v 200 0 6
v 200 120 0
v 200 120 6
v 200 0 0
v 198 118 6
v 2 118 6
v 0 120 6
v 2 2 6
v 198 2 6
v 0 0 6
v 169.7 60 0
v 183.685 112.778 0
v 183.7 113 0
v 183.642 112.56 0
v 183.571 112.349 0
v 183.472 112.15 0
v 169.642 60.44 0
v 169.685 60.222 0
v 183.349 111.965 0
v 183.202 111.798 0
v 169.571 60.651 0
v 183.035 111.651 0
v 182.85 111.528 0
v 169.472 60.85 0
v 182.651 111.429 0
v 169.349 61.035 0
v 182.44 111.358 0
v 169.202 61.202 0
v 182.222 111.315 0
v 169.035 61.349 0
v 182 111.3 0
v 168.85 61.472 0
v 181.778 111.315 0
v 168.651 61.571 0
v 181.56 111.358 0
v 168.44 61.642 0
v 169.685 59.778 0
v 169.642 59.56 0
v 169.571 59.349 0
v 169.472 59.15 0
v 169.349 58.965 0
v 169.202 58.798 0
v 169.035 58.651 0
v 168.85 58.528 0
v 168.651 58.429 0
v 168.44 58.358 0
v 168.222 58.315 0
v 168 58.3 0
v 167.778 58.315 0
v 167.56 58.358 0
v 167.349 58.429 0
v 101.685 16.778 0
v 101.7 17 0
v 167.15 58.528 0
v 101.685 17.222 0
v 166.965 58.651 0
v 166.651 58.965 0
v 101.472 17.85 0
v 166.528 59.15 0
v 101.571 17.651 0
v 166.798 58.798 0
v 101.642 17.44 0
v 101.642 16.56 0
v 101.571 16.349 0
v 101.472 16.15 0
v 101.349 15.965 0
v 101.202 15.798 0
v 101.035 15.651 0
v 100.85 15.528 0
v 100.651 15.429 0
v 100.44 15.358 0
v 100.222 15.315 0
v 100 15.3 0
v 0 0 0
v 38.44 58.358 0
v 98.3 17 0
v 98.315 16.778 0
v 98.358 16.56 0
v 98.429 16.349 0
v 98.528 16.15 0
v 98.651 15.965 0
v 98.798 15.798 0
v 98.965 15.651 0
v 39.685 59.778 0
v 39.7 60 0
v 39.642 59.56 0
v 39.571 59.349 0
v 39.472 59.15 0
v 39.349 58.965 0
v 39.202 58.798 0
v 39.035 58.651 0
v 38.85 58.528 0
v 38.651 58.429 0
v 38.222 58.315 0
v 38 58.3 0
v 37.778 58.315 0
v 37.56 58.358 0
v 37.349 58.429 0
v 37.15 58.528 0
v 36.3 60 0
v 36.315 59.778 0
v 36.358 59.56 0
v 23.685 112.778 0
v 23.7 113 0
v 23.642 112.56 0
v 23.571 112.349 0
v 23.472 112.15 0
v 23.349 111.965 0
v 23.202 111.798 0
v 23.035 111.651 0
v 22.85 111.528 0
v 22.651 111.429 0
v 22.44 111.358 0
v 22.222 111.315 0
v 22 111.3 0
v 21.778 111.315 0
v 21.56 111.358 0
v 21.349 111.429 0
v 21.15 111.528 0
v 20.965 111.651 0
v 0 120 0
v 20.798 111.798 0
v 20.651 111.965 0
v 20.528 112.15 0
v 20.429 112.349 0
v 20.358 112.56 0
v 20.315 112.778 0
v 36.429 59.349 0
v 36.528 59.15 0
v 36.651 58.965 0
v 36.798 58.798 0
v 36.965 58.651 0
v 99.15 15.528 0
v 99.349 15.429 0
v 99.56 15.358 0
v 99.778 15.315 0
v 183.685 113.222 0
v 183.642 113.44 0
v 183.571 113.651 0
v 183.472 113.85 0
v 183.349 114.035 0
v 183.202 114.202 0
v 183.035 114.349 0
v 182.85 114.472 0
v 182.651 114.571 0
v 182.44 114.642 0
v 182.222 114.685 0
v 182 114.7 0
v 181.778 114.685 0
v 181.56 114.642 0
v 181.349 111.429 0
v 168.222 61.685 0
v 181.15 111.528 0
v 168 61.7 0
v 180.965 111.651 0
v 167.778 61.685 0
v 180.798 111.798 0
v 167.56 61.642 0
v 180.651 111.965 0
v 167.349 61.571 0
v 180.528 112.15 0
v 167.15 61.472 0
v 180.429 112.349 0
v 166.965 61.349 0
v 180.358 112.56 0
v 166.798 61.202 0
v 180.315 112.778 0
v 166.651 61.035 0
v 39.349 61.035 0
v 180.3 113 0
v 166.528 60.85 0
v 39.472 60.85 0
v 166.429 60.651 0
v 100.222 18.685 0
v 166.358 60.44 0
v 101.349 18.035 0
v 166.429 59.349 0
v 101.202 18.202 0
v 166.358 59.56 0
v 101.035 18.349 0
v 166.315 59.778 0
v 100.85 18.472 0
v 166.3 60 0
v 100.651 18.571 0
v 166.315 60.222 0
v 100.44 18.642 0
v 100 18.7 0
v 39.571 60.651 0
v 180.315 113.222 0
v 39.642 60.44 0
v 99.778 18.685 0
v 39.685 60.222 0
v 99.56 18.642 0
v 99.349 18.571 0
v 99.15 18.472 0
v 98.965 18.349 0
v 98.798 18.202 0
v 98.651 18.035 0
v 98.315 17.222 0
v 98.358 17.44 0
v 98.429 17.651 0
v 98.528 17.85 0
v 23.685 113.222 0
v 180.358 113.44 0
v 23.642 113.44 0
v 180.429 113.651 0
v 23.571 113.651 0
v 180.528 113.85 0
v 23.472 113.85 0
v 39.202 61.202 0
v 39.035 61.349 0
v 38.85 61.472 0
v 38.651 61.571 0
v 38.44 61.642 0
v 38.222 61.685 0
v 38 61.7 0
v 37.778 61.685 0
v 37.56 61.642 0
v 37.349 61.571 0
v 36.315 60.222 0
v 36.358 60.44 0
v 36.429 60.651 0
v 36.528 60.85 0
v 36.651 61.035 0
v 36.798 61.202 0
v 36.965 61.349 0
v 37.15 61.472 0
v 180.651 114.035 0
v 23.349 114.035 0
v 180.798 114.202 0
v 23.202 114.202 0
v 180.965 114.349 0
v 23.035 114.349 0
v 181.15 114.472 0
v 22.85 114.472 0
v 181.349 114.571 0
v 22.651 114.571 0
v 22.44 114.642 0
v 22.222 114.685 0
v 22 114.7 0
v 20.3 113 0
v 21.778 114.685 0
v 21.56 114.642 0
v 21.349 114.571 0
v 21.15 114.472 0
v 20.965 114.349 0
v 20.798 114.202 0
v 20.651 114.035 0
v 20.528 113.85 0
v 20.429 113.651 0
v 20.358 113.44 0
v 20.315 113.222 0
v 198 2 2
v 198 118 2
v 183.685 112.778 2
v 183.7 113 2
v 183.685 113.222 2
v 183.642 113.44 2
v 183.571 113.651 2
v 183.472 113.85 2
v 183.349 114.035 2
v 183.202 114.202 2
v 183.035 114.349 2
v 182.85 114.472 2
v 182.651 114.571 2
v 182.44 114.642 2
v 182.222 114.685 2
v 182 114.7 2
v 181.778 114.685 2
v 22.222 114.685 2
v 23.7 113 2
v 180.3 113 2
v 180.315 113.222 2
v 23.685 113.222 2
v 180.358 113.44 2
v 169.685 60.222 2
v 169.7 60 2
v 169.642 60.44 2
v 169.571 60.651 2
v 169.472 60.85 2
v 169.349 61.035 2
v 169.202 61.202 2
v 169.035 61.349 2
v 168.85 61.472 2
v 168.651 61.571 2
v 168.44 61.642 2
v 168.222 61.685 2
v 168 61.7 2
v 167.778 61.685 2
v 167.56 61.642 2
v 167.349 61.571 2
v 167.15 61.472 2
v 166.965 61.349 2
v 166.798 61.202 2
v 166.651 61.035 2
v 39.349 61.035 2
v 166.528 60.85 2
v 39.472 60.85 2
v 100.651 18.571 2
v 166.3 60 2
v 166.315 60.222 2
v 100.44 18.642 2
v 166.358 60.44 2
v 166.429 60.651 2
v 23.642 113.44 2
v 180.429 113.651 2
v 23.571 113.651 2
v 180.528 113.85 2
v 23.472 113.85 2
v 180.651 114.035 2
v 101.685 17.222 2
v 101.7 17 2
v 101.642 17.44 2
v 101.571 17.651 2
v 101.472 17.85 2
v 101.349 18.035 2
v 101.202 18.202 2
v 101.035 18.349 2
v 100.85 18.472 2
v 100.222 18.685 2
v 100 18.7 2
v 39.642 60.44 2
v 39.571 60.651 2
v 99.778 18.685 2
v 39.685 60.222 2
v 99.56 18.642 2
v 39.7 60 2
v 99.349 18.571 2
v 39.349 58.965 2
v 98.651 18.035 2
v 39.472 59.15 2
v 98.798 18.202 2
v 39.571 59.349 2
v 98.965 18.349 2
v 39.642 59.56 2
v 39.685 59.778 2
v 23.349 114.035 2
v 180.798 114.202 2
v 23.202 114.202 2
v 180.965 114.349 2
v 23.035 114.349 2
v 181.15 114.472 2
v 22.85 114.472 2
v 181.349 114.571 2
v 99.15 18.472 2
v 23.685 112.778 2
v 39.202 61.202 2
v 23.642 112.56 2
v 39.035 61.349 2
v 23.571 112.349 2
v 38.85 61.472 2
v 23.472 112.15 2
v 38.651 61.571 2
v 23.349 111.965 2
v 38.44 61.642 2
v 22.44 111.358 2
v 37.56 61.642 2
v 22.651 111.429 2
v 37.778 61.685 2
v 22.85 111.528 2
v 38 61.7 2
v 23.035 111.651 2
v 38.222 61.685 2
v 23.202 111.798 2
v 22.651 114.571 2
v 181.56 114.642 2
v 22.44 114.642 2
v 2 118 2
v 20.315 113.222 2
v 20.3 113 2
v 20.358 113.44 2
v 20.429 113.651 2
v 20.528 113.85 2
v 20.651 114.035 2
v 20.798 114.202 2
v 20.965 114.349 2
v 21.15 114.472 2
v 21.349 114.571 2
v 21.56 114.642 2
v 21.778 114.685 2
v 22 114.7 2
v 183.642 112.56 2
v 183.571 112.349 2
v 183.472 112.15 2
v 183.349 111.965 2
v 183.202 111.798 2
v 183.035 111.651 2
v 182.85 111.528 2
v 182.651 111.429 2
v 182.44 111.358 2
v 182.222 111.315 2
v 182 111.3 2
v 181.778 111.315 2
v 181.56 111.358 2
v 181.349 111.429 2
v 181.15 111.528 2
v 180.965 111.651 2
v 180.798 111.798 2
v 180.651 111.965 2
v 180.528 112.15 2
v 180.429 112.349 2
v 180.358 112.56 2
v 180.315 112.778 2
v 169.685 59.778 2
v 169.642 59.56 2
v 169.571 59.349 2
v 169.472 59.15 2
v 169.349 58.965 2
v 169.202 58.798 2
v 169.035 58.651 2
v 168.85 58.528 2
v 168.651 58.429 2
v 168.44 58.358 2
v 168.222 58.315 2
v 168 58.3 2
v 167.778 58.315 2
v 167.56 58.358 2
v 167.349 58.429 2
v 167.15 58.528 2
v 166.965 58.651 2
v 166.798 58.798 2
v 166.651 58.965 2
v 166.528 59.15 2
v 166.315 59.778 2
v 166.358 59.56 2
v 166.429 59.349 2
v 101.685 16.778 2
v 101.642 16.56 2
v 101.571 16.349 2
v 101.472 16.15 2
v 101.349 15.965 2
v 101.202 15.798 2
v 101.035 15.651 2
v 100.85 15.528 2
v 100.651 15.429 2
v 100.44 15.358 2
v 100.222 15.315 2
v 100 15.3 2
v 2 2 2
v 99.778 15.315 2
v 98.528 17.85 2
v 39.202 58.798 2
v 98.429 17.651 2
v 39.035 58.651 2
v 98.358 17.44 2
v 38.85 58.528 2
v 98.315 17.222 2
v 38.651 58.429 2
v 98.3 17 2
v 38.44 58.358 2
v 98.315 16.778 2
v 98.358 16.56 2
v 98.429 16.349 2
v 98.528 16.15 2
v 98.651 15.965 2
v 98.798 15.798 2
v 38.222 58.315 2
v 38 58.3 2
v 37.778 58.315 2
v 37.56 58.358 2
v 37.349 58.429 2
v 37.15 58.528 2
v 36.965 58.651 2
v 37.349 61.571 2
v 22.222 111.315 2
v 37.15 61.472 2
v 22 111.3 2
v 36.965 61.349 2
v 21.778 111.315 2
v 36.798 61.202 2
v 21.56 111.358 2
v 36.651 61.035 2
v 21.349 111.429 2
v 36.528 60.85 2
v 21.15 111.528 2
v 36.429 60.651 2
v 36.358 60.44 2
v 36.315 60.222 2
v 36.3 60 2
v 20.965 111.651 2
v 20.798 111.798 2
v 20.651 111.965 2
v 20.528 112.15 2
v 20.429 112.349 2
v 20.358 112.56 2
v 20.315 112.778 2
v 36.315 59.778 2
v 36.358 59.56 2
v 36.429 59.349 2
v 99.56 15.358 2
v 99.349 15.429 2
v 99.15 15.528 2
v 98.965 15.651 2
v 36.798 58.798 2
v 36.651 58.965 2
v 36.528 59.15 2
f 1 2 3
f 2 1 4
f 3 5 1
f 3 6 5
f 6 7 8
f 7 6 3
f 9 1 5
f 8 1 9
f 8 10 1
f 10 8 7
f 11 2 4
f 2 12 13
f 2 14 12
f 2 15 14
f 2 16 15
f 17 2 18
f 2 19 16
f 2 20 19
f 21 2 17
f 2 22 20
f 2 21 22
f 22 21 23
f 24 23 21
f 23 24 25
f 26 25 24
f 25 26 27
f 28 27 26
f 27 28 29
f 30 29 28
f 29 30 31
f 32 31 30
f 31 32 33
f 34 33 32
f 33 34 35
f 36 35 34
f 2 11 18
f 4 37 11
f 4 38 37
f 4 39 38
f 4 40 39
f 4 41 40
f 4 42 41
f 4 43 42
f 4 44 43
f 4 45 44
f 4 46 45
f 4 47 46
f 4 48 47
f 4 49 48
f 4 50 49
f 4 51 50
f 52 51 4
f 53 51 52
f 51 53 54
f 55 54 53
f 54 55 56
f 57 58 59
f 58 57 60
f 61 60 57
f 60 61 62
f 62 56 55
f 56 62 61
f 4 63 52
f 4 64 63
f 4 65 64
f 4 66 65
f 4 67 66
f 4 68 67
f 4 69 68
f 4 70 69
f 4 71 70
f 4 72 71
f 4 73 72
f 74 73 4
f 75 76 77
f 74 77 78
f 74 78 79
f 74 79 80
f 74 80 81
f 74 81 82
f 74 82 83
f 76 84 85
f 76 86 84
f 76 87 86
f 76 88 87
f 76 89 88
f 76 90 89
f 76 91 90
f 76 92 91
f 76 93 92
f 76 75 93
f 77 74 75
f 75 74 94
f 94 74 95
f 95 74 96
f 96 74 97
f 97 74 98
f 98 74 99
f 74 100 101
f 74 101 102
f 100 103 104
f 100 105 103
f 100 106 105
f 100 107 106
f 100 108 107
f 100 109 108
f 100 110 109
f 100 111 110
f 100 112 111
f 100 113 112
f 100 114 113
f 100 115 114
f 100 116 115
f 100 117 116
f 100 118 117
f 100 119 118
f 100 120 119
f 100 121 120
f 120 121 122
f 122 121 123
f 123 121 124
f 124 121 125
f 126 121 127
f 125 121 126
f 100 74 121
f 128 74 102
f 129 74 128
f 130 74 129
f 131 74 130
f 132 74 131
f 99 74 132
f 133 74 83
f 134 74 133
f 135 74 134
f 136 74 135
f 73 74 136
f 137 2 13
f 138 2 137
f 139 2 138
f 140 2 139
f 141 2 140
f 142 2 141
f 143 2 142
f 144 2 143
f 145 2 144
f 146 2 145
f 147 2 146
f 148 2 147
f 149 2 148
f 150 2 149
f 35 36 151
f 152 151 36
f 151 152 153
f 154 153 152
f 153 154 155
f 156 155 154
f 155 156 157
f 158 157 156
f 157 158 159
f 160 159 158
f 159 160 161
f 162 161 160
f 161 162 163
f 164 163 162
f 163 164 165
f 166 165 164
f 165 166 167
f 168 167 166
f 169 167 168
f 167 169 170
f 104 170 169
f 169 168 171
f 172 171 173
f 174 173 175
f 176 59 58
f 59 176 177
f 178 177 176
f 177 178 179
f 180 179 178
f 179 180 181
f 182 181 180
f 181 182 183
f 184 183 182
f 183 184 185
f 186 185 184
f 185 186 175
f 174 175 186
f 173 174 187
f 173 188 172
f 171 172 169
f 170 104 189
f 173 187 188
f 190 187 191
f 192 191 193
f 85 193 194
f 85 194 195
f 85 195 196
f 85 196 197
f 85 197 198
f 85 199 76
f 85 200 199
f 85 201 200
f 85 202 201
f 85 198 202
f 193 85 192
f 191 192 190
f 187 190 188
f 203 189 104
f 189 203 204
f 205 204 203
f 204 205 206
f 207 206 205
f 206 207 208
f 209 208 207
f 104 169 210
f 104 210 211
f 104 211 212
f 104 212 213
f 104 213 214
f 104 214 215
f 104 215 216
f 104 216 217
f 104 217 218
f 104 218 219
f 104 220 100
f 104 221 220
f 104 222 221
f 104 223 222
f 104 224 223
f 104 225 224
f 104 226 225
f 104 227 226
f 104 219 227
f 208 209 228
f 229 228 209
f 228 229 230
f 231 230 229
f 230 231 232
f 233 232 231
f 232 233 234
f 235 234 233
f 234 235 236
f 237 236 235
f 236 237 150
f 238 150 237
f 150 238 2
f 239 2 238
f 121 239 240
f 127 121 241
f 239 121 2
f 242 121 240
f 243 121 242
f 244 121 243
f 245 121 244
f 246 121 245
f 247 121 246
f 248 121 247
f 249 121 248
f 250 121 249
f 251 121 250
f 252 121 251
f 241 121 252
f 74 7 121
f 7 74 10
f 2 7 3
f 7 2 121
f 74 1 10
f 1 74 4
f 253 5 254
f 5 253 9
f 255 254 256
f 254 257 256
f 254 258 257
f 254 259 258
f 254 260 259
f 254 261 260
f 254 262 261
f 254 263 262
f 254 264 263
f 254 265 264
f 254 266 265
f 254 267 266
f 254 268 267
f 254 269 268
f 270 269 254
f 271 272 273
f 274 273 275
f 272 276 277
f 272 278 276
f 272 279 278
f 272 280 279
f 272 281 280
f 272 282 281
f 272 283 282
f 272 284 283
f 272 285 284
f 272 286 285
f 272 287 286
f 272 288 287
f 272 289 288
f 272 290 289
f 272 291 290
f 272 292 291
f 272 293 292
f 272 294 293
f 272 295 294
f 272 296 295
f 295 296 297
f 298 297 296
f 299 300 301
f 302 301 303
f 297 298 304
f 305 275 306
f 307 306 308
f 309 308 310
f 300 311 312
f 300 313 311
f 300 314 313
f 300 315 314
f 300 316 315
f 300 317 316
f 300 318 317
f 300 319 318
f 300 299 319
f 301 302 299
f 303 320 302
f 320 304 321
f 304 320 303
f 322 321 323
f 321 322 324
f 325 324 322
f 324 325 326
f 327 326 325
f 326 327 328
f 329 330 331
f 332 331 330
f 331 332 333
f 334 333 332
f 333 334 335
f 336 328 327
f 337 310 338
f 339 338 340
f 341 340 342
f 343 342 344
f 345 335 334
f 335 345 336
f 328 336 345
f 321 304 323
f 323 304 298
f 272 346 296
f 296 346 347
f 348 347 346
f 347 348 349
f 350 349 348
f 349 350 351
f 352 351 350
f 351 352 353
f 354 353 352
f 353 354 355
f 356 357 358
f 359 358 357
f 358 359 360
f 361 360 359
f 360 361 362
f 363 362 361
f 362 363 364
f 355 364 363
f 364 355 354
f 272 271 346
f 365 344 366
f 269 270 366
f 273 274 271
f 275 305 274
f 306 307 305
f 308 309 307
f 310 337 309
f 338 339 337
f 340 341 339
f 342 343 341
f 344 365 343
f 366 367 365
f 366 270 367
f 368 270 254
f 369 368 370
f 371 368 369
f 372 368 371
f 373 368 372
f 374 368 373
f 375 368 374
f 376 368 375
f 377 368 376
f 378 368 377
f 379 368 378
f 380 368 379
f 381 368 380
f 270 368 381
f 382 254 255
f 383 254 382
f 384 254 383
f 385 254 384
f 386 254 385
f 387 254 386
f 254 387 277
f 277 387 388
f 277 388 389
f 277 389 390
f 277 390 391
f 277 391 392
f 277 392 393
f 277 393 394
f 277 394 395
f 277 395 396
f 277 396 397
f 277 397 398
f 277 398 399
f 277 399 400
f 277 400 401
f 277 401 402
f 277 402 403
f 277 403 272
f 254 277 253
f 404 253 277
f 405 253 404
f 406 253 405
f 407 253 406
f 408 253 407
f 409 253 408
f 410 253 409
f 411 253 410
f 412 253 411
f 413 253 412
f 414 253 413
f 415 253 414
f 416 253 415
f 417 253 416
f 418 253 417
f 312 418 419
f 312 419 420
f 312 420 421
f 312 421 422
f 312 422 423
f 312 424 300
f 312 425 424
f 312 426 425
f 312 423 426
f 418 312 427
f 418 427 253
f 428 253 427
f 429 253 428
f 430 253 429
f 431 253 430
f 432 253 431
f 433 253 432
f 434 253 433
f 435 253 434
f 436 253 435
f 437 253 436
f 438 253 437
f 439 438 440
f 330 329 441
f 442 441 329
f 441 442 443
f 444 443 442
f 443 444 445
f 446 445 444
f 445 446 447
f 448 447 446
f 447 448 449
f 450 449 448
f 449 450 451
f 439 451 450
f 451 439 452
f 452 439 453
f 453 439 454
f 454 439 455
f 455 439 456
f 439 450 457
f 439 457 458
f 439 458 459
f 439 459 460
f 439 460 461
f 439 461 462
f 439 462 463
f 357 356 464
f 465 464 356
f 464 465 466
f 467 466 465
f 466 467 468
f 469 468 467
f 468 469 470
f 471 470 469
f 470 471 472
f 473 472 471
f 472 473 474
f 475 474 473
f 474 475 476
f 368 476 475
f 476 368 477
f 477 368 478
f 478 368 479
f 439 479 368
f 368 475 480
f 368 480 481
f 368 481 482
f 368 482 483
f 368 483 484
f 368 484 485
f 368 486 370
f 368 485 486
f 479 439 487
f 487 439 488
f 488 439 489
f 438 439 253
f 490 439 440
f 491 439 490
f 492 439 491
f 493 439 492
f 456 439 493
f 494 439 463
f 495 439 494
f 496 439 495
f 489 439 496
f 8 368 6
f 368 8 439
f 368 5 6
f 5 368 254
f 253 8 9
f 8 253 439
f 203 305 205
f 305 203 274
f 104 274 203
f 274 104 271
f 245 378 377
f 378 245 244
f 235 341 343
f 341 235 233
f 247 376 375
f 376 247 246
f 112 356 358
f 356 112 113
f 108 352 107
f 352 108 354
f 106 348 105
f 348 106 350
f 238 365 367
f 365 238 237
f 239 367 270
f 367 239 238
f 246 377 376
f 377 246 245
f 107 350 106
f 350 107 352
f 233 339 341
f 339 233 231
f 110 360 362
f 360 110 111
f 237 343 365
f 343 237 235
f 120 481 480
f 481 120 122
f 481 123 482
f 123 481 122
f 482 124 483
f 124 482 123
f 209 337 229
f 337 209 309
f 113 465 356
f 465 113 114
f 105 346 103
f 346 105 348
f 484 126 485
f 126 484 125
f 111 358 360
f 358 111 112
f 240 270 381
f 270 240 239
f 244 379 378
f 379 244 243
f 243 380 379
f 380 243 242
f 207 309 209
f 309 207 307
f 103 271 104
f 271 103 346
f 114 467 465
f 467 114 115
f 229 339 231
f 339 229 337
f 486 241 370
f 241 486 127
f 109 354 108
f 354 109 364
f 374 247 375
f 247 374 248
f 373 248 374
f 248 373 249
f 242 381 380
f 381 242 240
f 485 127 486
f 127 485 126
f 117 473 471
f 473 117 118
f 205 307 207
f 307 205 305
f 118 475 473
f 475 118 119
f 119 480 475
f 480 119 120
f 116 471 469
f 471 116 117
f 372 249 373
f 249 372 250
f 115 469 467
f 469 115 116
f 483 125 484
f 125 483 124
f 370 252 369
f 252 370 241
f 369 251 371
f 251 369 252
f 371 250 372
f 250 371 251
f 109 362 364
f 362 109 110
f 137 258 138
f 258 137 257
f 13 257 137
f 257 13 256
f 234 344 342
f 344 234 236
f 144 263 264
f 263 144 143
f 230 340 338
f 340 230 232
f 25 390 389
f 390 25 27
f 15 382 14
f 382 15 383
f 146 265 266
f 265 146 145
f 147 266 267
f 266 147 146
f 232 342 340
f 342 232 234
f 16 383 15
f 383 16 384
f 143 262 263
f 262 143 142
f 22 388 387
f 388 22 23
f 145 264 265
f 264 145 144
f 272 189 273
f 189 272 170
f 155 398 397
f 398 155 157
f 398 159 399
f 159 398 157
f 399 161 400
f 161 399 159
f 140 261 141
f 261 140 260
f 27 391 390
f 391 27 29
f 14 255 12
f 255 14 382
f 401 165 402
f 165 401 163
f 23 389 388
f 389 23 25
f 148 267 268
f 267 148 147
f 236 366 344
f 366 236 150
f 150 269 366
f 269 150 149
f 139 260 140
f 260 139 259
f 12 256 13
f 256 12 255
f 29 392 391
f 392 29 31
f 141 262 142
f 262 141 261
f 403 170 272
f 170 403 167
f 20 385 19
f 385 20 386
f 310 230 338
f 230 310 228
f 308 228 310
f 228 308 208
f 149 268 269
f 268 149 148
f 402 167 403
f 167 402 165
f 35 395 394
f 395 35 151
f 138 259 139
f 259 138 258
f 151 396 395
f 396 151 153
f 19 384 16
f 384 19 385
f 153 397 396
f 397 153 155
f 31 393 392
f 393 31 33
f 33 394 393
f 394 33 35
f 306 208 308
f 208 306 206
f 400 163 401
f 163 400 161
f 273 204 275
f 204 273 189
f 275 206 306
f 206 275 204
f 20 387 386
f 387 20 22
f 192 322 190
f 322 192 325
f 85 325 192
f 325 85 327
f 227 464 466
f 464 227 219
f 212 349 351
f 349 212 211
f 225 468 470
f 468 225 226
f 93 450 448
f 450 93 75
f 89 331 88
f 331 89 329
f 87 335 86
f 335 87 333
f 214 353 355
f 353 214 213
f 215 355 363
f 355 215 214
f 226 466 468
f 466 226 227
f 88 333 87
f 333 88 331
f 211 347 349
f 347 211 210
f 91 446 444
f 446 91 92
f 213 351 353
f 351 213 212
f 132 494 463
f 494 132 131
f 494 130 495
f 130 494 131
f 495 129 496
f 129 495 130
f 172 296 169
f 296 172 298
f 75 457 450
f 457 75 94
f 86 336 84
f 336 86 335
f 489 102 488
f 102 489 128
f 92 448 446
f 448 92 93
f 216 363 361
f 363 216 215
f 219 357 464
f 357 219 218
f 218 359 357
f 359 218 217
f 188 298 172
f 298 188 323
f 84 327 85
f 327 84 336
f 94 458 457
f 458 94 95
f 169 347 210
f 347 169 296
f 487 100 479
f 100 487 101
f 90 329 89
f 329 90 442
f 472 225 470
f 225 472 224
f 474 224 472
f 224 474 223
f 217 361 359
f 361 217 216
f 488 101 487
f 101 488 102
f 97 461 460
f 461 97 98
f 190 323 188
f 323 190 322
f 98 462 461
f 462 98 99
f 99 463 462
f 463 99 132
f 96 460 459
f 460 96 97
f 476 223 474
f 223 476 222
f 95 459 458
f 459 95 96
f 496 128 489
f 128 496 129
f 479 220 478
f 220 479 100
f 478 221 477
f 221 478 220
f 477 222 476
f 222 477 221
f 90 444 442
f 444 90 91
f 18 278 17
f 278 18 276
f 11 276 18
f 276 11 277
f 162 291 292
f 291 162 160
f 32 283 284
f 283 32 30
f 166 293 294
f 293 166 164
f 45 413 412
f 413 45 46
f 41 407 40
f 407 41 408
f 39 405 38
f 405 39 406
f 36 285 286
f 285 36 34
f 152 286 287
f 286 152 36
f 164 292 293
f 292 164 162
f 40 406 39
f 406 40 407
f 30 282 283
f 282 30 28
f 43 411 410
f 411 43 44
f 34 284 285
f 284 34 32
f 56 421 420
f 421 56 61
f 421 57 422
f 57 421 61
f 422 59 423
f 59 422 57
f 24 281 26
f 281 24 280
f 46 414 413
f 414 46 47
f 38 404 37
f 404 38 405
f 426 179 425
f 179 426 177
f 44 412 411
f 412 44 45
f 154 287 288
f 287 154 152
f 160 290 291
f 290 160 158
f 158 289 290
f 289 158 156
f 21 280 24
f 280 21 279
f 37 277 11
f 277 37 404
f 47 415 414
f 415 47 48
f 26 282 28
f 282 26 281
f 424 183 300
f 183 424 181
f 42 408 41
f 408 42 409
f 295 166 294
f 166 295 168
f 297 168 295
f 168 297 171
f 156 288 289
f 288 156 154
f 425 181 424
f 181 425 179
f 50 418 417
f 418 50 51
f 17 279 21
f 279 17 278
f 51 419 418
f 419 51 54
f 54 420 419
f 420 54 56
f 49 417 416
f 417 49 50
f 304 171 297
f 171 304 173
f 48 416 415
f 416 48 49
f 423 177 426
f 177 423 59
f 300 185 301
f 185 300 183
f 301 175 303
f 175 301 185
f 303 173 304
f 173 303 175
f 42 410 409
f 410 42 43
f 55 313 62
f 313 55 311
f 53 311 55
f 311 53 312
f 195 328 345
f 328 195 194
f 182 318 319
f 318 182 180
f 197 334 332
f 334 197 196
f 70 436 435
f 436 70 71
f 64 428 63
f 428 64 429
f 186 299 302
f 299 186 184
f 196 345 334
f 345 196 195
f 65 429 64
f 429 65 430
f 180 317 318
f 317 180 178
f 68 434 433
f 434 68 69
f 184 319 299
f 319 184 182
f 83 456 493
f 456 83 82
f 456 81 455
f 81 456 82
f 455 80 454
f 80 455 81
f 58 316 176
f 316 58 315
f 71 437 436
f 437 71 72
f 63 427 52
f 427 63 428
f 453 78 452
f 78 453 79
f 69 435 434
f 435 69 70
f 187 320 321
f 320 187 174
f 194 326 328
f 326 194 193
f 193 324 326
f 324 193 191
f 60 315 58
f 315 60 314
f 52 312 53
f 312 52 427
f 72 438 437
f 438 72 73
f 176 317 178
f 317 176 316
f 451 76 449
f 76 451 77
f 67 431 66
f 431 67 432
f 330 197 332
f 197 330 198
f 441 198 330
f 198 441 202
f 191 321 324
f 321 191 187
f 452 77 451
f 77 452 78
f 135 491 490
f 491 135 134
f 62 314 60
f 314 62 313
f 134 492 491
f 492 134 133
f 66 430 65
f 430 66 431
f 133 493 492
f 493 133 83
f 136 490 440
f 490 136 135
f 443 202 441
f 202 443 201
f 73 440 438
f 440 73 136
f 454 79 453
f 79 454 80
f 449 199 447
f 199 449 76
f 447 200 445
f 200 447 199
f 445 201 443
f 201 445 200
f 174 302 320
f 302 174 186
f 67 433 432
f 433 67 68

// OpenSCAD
// Desk Organizer — Portacosas
// Parametric modular desk organizer with snap-fit tray system
// render_mode selects part: 0=tray_base, 1=pen_holder, 2=phone_stand,
//                           3=card_slot, 4=cable_clip, 5=label_plate

// --- Parameters ---
render_mode = 0;

// Tray dimensions
tray_width = 200;
tray_depth = 120;
wall_height = 80;
wall_thickness = 2.0;

// Pen holder
pen_count = 5;
pen_diameter = 12;
pen_style = false; // false=round, true=hex

// Phone stand
phone_width = 75;
phone_angle = 65;
charging_slot = true;

// Card slot
card_width = 90;
card_depth = 60;
card_angle = 10;

// Cable clip
clip_count = 2;
clip_diameter = 6;

// Personalization
label_text = "QUBIC";
label_depth = 0.5;

// Grid (used by grid.scad)
rows = 1;
cols = 1;

// Resolution
$fn = 48;

// --- Derived ---
snap_size = 3;        // snap-fit nub size
snap_tol = 0.2;       // snap-fit tolerance
base_h = wall_thickness;  // tray floor thickness
pen_holder_w = pen_count * (pen_diameter + wall_thickness) + wall_thickness;
pen_holder_d = pen_diameter + wall_thickness * 2;

// --- Snap-fit socket/nub helpers ---
module snap_nub(h=snap_size) {
    cylinder(d1=snap_size, d2=snap_size*0.6, h=h);
}

module snap_socket(h=snap_size) {
    cylinder(d=snap_size + snap_tol*2, h=h+0.1);
}

// --- Tray Base ---
module tray_base() {
    difference() {
        union() {
            // Floor plate
            cube([tray_width, tray_depth, base_h]);
            // Low perimeter lip
            difference() {
                cube([tray_width, tray_depth, base_h + 4]);
                translate([wall_thickness, wall_thickness, base_h])
                    cube([tray_width - wall_thickness*2,
                          tray_depth - wall_thickness*2,
                          5]);
            }
        }
        // Snap-fit sockets for components
        // Pen holder socket — left side
        translate([wall_thickness + pen_holder_w/2,
                   tray_depth/2, -0.05])
            snap_socket(base_h + 0.1);
        // Phone stand socket — right side
        translate([tray_width - wall_thickness - 30,
                   tray_depth/2, -0.05])
            snap_socket(base_h + 0.1);
        // Card slot socket — front center
        translate([tray_width/2,
                   wall_thickness + 15, -0.05])
            snap_socket(base_h + 0.1);
        // Cable clip sockets — back edge
        for (i = [0 : clip_count - 1]) {
            translate([wall_thickness + 20 + i * (tray_width - 40) / max(clip_count - 1, 1),
                       tray_depth - wall_thickness - 5, -0.05])
                snap_socket(base_h + 0.1);
        }
    }
}

// --- Pen Holder ---
module pen_holder() {
    holder_h = wall_height * 0.7;
    difference() {
        // Outer shell
        if (pen_style) {
            // Hex grid container
            cube([pen_holder_w, pen_holder_d, holder_h]);
        } else {
            cube([pen_holder_w, pen_holder_d, holder_h]);
        }
        // Pen bores
        for (i = [0 : pen_count - 1]) {
            px = wall_thickness + pen_diameter/2 + i * (pen_diameter + wall_thickness);
            py = pen_holder_d / 2;
            translate([px, py, wall_thickness]) {
                if (pen_style) {
                    // Hexagonal bore
                    cylinder(d=pen_diameter, h=holder_h, $fn=6);
                } else {
                    cylinder(d=pen_diameter, h=holder_h);
                }
            }
        }
    }
    // Snap nub on bottom
    translate([pen_holder_w/2, pen_holder_d/2, 0])
        mirror([0,0,1]) snap_nub();
}

// --- Phone Stand ---
module phone_stand() {
    stand_d = 40;
    stand_h = wall_height * 0.8;
    lip_h = 10;

    difference() {
        union() {
            // Back angled support — hull for smooth cradle
            hull() {
                cube([phone_width, wall_thickness, stand_h]);
                translate([0, stand_d, 0])
                    cube([phone_width, wall_thickness, lip_h]);
            }
            // Bottom platform
            cube([phone_width, stand_d + wall_thickness, wall_thickness]);
            // Front lip
            translate([0, stand_d, 0])
                cube([phone_width, wall_thickness, lip_h]);
        }
        // Charging slot cutout
        if (charging_slot) {
            slot_w = 25;
            slot_h = 8;
            translate([(phone_width - slot_w)/2, -0.1, wall_thickness])
                cube([slot_w, wall_thickness + 0.2, slot_h]);
            translate([(phone_width - slot_w)/2, -0.1, wall_thickness])
                cube([slot_w, stand_d * 0.3, slot_h]);
        }
    }
    // Snap nub on bottom center
    translate([phone_width/2, stand_d/2, 0])
        mirror([0,0,1]) snap_nub();
}

// --- Card Slot ---
module card_slot() {
    slot_h = wall_height * 0.4;
    difference() {
        // Angled pocket
        hull() {
            cube([card_width, wall_thickness, slot_h]);
            translate([0, card_depth, 0])
                cube([card_width, wall_thickness, slot_h * 0.3]);
        }
        // Interior cutout
        translate([wall_thickness, wall_thickness, wall_thickness])
            hull() {
                cube([card_width - wall_thickness*2, 0.1, slot_h - wall_thickness]);
                translate([0, card_depth - wall_thickness, 0])
                    cube([card_width - wall_thickness*2, 0.1,
                          slot_h * 0.3 - wall_thickness]);
            }
    }
    // Bottom platform
    cube([card_width, card_depth + wall_thickness, wall_thickness]);
    // Snap nub
    translate([card_width/2, card_depth/2, 0])
        mirror([0,0,1]) snap_nub();
}

// --- Cable Clip ---
module cable_clip() {
    clip_h = 15;
    clip_w = clip_diameter + wall_thickness * 2;
    gap = clip_diameter * 0.4; // opening gap

    difference() {
        cylinder(d=clip_w, h=clip_h);
        // Cable bore
        translate([0, 0, wall_thickness])
            cylinder(d=clip_diameter, h=clip_h);
        // C-shaped opening
        translate([0, clip_w/2, wall_thickness + clip_h * 0.3])
            cube([gap, clip_w, clip_h], center=true);
    }
    // Base pad
    translate([-clip_w/2, -clip_w/2, 0])
        cube([clip_w, clip_w, wall_thickness]);
    // Snap nub
    mirror([0,0,1]) snap_nub();
}

// --- Label Plate ---
module label_plate() {
    plate_w = tray_width * 0.4;
    plate_h = 12;
    plate_d = wall_thickness;

    difference() {
        cube([plate_w, plate_d, plate_h]);
        // Embossed text
        translate([plate_w/2, -0.01, plate_h/2])
            rotate([90, 0, 180])
                linear_extrude(height=label_depth + 0.01)
                    text(label_text, size=plate_h * 0.6,
                         halign="center", valign="center",
                         font="Liberation Sans:style=Bold");
    }
}

// --- Render Selector ---
if (render_mode == 0) tray_base();
if (render_mode == 1) pen_holder();
if (render_mode == 2) phone_stand();
if (render_mode == 3) card_slot();
if (render_mode == 4) cable_clip();
if (render_mode == 5) label_plate();
